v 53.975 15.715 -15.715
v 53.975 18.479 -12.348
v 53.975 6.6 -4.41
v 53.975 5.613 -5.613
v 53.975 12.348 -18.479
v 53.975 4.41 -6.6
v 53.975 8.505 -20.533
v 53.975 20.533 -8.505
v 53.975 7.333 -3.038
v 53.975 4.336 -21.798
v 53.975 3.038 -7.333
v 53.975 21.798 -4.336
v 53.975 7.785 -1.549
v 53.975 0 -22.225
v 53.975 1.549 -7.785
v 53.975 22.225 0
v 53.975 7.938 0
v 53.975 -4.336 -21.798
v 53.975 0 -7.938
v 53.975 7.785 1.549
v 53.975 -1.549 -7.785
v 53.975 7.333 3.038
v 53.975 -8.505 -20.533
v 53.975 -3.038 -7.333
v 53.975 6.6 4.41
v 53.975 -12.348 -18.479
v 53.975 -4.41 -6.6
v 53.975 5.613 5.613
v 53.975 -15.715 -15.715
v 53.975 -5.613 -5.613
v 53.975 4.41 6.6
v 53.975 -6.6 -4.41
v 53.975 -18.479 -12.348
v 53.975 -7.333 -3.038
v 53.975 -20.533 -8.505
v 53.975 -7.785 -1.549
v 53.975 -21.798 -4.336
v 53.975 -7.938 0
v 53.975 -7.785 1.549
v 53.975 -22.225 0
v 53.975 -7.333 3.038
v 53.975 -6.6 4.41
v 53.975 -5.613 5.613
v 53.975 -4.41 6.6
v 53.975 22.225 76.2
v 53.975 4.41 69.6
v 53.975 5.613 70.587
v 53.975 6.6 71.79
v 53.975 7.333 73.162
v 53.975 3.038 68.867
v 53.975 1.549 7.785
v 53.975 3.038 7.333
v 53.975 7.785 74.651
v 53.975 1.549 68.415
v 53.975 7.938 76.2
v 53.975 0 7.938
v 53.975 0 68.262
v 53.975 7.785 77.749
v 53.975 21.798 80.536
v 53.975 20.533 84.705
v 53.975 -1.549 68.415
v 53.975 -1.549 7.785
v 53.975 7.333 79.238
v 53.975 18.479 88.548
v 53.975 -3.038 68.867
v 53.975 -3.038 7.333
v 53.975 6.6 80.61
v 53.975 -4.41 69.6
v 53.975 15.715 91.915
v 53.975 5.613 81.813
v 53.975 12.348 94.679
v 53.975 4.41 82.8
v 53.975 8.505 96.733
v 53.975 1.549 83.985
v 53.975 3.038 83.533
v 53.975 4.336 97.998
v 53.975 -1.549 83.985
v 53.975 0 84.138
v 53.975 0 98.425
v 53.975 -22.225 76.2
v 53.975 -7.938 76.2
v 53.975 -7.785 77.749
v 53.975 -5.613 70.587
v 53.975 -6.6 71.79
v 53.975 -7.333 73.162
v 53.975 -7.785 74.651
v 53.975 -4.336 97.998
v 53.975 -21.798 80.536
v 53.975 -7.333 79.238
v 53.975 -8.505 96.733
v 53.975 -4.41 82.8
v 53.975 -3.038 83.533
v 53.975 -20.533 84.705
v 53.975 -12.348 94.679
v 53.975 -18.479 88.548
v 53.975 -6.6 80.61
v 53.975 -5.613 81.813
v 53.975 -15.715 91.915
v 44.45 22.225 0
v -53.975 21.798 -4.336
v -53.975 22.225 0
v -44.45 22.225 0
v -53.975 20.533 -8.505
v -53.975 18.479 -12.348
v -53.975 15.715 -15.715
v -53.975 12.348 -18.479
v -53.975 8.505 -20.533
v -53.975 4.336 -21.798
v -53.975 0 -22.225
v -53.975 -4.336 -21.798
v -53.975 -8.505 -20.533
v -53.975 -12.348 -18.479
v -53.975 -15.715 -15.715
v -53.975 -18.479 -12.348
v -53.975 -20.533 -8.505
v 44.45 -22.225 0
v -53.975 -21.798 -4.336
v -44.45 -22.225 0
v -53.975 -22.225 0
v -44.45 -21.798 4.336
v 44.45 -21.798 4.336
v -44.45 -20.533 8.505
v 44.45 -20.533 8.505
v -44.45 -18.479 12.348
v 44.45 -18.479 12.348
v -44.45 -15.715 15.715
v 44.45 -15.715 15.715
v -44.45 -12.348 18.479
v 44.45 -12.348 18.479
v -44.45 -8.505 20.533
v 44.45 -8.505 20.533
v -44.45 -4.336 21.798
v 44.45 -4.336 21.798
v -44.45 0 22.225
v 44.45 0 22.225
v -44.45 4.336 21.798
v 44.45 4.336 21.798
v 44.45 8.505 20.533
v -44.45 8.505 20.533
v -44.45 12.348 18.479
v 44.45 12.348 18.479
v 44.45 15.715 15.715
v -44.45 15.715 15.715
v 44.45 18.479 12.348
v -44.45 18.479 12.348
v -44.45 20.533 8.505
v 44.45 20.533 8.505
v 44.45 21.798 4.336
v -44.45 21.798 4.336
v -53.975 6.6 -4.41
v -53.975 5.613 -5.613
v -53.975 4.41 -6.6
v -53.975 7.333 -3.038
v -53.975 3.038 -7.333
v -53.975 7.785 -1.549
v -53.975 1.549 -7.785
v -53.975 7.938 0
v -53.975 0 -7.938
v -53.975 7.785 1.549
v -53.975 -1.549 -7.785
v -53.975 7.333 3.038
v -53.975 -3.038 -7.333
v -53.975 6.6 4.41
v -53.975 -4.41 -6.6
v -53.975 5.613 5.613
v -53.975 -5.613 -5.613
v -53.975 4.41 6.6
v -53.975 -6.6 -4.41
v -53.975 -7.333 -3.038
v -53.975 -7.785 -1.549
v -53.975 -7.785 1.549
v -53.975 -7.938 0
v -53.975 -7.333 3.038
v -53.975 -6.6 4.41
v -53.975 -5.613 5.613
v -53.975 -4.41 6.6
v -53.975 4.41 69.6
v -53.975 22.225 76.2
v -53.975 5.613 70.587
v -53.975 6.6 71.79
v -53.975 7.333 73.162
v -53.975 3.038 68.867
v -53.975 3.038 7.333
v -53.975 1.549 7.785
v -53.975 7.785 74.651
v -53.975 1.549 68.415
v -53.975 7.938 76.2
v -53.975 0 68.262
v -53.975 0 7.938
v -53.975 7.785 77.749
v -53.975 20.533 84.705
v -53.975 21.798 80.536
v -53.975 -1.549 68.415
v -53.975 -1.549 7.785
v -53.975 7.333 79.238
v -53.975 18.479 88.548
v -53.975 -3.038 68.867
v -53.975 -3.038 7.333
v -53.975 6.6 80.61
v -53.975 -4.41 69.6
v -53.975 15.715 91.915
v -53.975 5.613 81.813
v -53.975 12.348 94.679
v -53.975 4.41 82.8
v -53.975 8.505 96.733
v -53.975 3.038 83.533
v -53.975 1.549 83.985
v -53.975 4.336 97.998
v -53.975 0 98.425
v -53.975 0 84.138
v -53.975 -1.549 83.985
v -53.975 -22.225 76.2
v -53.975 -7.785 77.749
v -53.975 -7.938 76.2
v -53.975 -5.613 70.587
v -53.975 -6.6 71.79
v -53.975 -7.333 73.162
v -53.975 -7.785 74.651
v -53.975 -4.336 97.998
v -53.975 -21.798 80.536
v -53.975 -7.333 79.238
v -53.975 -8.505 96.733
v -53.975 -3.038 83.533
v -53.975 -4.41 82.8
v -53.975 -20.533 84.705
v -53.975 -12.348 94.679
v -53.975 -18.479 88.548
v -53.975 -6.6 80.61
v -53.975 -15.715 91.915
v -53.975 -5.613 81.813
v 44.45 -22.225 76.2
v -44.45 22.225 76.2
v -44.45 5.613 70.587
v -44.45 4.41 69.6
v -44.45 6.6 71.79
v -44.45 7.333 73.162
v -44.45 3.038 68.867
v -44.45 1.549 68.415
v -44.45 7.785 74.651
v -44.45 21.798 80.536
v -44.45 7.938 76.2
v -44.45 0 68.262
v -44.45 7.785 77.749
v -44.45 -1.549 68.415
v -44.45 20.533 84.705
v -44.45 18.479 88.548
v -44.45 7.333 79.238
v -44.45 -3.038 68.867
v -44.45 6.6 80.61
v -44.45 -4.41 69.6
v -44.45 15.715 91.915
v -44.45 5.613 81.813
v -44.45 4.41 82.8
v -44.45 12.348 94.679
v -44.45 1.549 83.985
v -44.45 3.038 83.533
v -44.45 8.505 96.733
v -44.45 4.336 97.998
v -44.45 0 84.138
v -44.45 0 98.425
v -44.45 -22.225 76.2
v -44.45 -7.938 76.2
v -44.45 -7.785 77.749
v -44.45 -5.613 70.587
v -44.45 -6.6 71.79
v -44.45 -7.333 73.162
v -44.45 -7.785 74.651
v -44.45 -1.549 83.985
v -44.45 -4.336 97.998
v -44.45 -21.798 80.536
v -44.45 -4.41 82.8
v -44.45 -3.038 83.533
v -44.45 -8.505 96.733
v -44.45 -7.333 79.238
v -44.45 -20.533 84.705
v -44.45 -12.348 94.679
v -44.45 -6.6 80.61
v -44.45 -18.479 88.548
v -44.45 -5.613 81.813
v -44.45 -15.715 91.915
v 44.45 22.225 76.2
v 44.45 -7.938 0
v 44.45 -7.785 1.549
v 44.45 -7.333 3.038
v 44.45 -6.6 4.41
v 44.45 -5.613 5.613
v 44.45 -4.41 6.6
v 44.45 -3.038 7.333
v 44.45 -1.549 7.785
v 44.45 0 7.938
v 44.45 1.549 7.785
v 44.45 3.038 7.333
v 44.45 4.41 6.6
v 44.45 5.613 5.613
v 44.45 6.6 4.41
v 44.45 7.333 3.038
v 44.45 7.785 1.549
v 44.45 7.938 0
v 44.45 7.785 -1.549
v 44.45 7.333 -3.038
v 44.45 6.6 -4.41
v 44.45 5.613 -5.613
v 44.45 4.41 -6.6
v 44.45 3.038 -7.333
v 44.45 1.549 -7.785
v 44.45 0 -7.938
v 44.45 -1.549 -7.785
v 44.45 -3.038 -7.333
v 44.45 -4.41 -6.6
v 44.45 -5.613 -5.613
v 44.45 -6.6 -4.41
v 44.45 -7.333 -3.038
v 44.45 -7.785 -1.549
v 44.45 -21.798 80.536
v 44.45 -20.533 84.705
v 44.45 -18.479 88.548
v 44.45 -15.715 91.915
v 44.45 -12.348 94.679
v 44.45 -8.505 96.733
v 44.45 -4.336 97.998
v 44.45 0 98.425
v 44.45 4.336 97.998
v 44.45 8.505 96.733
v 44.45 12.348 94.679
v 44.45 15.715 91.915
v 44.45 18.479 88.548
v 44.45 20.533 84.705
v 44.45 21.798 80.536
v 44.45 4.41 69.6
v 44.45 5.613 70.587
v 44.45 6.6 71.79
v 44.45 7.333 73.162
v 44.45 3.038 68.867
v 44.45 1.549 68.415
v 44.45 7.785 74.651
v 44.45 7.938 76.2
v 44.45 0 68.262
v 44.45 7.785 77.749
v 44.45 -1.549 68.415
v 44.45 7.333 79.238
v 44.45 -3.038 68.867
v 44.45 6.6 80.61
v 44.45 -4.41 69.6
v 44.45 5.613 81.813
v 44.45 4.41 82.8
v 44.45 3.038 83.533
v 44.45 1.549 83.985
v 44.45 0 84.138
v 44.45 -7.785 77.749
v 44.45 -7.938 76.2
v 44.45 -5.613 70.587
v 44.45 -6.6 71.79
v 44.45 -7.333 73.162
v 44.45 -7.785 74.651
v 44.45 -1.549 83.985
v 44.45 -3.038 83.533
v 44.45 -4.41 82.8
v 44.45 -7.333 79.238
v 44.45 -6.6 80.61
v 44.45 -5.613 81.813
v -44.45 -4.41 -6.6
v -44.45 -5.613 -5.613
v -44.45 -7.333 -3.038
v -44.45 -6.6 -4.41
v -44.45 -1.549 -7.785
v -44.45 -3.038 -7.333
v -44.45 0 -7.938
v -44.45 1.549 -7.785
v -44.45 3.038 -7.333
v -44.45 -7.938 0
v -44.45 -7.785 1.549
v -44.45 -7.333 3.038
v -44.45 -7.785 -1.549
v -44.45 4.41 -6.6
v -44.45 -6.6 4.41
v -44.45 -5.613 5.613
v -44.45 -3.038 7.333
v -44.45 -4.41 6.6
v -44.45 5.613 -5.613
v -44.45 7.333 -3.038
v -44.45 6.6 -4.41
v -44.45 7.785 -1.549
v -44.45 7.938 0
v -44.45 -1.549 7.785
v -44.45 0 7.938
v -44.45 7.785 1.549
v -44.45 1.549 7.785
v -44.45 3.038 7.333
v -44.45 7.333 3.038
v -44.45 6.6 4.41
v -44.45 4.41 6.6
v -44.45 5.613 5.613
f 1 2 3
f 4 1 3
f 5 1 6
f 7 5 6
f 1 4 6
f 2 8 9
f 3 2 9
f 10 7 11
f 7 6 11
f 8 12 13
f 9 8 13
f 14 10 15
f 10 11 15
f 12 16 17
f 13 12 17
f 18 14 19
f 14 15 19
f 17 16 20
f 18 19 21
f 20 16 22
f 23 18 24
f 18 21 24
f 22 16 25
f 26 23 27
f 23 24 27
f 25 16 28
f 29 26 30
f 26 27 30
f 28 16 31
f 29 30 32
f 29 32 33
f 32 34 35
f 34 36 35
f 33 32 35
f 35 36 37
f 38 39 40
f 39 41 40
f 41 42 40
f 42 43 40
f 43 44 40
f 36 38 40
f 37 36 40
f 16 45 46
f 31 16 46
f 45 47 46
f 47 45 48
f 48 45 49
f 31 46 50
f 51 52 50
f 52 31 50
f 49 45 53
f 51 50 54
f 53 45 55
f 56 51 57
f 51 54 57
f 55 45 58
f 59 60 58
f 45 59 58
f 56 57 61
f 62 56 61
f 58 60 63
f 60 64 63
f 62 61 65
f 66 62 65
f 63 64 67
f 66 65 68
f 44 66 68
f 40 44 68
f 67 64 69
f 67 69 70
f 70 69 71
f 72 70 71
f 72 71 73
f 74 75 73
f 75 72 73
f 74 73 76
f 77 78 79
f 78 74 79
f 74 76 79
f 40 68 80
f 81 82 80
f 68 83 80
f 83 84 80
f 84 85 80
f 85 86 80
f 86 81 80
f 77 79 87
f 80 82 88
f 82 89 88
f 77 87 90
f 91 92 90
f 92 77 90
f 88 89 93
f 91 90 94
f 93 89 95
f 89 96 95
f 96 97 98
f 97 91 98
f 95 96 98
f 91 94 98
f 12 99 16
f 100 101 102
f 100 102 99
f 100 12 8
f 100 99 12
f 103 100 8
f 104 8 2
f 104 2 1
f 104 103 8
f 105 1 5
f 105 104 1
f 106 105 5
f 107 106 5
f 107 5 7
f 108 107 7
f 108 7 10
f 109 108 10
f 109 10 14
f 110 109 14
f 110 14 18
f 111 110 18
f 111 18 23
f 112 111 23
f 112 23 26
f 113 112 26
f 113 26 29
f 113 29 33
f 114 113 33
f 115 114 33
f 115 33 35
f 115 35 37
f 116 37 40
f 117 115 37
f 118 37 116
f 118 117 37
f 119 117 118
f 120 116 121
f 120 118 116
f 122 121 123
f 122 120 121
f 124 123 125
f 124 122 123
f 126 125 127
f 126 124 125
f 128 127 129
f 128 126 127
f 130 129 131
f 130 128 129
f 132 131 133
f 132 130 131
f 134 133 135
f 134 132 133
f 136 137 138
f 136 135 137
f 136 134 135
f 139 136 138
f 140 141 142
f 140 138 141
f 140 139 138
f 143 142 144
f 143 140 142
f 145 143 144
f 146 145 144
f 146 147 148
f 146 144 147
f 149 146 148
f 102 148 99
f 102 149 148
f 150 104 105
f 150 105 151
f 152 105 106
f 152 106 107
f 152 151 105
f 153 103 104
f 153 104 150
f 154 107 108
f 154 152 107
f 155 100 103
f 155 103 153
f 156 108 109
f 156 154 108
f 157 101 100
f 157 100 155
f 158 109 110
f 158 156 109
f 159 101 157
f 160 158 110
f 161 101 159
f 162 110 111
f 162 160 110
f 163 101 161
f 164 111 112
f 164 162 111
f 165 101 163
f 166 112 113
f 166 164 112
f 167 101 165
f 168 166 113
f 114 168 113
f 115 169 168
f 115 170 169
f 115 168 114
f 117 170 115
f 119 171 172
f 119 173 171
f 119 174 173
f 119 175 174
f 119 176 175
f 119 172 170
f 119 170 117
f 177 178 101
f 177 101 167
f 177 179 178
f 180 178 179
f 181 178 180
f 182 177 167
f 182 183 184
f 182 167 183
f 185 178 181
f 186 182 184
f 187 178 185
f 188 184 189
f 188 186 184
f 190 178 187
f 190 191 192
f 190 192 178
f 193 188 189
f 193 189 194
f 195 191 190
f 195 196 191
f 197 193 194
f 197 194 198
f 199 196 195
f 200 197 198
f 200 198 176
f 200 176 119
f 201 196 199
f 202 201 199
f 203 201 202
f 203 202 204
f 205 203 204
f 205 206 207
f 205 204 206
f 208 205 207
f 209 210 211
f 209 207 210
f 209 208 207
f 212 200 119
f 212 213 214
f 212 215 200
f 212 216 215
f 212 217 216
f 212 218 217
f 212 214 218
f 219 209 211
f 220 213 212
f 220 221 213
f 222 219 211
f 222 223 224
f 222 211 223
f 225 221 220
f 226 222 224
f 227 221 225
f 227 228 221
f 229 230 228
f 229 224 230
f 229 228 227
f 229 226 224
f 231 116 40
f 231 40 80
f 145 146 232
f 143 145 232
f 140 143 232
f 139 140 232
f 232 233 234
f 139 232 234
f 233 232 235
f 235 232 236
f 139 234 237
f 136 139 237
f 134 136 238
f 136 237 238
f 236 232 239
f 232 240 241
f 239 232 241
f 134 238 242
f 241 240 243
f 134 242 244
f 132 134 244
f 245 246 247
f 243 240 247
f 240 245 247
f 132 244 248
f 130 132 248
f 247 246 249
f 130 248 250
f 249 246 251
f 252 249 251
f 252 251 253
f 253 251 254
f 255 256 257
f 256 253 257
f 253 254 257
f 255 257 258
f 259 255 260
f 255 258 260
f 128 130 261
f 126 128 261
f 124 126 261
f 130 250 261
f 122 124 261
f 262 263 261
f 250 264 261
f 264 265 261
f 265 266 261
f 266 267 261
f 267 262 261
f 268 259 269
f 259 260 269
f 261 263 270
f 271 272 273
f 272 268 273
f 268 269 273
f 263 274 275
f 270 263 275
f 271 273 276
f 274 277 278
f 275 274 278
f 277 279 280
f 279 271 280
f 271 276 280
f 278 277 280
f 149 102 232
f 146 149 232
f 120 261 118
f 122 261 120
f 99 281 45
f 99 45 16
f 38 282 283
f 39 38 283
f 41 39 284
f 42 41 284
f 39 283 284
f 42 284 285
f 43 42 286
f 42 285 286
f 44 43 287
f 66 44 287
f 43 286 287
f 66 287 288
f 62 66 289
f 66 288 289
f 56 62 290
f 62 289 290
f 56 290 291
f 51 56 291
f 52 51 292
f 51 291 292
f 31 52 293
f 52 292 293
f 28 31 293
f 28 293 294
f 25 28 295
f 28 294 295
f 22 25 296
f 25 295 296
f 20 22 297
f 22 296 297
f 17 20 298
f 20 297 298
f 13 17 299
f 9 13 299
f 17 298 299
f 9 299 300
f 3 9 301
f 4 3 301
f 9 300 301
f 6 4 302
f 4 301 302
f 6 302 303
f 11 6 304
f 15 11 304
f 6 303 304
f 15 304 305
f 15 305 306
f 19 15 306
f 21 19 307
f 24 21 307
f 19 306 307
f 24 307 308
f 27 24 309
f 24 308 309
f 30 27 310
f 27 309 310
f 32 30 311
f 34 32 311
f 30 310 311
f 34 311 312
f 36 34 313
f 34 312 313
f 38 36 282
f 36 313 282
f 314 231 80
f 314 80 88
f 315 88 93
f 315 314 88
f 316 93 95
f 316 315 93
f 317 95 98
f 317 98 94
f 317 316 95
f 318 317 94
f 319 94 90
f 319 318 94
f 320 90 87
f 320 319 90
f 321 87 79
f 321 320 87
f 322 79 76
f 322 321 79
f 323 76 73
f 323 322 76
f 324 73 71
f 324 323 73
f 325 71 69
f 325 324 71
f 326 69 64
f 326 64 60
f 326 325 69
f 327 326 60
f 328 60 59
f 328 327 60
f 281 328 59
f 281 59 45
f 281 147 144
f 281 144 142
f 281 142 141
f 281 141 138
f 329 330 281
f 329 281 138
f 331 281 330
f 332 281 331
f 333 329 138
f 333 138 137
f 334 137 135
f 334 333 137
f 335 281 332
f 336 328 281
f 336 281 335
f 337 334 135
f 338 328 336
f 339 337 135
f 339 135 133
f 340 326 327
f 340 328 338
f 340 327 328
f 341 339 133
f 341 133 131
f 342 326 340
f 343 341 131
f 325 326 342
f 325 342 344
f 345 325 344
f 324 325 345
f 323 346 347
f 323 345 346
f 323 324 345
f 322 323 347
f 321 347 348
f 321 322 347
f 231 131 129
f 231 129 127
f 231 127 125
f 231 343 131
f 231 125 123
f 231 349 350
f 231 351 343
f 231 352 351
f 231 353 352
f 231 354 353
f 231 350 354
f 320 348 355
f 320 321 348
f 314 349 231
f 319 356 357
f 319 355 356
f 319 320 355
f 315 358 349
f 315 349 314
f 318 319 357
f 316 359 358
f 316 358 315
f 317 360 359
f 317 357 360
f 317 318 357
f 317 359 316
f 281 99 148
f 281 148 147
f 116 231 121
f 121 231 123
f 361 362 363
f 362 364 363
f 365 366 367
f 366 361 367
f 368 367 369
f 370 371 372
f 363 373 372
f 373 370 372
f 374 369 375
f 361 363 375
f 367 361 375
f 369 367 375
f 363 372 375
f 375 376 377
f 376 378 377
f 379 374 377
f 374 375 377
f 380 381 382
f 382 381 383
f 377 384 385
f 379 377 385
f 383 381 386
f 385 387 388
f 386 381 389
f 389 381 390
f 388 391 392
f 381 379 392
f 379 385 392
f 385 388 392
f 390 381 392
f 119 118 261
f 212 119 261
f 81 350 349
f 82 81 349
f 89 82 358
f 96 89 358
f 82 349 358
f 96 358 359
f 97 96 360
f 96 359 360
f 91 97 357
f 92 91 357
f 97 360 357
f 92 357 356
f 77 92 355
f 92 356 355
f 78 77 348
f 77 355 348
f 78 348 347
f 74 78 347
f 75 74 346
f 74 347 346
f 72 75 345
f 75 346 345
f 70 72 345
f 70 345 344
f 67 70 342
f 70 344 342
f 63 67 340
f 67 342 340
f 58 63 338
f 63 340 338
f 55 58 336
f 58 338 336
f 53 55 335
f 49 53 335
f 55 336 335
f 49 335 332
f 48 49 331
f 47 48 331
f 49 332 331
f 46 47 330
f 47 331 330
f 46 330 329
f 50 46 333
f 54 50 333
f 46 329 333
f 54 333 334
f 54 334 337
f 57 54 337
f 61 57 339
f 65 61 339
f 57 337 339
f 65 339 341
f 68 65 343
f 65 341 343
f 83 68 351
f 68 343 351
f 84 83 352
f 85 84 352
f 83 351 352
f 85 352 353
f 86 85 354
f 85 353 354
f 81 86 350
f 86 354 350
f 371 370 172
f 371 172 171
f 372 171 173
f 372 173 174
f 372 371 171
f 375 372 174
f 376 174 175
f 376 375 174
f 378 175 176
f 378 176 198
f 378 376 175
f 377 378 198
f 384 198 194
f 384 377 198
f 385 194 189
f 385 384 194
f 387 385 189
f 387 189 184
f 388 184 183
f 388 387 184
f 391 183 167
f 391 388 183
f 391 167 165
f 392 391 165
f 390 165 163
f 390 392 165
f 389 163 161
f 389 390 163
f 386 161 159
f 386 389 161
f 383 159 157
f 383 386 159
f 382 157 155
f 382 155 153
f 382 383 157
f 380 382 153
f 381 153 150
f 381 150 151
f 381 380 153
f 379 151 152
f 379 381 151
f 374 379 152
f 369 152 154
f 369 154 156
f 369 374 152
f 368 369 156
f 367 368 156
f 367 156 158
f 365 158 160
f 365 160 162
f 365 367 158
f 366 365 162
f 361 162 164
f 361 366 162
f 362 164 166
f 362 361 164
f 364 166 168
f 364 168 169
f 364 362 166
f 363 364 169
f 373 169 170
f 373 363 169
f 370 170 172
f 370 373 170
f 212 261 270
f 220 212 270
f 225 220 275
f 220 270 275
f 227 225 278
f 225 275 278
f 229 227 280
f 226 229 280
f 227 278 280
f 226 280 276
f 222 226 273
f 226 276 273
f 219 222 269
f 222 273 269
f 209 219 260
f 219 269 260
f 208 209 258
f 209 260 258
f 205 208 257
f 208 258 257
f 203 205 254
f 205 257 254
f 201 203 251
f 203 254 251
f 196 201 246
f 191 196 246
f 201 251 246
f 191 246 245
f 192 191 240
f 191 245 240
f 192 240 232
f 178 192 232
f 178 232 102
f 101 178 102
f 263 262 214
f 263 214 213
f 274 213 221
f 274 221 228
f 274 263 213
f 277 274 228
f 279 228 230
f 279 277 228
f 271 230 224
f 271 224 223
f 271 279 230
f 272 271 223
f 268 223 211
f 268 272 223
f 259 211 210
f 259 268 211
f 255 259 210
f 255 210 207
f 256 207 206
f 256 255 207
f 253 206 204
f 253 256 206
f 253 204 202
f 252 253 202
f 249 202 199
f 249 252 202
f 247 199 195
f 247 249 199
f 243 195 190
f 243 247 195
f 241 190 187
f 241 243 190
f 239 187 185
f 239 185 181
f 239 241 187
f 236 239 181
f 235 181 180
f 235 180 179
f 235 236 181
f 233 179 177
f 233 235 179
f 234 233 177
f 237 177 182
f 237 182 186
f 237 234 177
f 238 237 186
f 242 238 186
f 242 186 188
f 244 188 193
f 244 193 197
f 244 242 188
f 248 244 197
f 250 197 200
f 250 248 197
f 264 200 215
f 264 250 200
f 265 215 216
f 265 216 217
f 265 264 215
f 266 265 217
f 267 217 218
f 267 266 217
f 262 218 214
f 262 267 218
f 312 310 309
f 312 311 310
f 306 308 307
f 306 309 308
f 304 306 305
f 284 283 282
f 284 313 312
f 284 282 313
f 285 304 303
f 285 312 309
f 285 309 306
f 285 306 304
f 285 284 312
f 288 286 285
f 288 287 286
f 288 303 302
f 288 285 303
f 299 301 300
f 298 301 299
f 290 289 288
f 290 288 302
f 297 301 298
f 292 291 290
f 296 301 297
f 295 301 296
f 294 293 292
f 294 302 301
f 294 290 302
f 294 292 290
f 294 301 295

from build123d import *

# Parameters (mm, degrees)
F0_R     = 22.225
F1_DEPTH = 44.45
F2_R     = 7.9375
F3_DEPTH = 9.525


with BuildPart() as f1:
    # F0 (on Right) → F1 (new body, symmetric)
    with BuildSketch(Plane.YZ):
        Circle(F0_R)
    extrude(amount=F1_DEPTH, both=True)

    # F2 (on face) → F3 (join)
    with BuildSketch(Plane(origin=(-44.45, 0, 0), x_dir=(0, -1, 0), z_dir=(-1, 0, 0))):
        with BuildLine():
            Line((-22.225, 76.2), (-22.225, 0))
            ThreePointArc((-22.225, 0), (0, -22.225), (22.225, 0))
            Line((22.225, 0), (22.225, 76.2))
            ThreePointArc((22.225, 76.2), (0, 98.425), (-22.225, 76.2))
        make_face()
        Circle(F2_R, mode=Mode.SUBTRACT)
        with Locations((0, 76.2)):
            Circle(F2_R, mode=Mode.SUBTRACT)
    extrude(amount=F3_DEPTH)

    # F4: F1 across plane


with BuildPart() as f1_1:
    add(f1.part)
    add(f1.part.mirror(Plane.YZ))


solid = f1_1.part
